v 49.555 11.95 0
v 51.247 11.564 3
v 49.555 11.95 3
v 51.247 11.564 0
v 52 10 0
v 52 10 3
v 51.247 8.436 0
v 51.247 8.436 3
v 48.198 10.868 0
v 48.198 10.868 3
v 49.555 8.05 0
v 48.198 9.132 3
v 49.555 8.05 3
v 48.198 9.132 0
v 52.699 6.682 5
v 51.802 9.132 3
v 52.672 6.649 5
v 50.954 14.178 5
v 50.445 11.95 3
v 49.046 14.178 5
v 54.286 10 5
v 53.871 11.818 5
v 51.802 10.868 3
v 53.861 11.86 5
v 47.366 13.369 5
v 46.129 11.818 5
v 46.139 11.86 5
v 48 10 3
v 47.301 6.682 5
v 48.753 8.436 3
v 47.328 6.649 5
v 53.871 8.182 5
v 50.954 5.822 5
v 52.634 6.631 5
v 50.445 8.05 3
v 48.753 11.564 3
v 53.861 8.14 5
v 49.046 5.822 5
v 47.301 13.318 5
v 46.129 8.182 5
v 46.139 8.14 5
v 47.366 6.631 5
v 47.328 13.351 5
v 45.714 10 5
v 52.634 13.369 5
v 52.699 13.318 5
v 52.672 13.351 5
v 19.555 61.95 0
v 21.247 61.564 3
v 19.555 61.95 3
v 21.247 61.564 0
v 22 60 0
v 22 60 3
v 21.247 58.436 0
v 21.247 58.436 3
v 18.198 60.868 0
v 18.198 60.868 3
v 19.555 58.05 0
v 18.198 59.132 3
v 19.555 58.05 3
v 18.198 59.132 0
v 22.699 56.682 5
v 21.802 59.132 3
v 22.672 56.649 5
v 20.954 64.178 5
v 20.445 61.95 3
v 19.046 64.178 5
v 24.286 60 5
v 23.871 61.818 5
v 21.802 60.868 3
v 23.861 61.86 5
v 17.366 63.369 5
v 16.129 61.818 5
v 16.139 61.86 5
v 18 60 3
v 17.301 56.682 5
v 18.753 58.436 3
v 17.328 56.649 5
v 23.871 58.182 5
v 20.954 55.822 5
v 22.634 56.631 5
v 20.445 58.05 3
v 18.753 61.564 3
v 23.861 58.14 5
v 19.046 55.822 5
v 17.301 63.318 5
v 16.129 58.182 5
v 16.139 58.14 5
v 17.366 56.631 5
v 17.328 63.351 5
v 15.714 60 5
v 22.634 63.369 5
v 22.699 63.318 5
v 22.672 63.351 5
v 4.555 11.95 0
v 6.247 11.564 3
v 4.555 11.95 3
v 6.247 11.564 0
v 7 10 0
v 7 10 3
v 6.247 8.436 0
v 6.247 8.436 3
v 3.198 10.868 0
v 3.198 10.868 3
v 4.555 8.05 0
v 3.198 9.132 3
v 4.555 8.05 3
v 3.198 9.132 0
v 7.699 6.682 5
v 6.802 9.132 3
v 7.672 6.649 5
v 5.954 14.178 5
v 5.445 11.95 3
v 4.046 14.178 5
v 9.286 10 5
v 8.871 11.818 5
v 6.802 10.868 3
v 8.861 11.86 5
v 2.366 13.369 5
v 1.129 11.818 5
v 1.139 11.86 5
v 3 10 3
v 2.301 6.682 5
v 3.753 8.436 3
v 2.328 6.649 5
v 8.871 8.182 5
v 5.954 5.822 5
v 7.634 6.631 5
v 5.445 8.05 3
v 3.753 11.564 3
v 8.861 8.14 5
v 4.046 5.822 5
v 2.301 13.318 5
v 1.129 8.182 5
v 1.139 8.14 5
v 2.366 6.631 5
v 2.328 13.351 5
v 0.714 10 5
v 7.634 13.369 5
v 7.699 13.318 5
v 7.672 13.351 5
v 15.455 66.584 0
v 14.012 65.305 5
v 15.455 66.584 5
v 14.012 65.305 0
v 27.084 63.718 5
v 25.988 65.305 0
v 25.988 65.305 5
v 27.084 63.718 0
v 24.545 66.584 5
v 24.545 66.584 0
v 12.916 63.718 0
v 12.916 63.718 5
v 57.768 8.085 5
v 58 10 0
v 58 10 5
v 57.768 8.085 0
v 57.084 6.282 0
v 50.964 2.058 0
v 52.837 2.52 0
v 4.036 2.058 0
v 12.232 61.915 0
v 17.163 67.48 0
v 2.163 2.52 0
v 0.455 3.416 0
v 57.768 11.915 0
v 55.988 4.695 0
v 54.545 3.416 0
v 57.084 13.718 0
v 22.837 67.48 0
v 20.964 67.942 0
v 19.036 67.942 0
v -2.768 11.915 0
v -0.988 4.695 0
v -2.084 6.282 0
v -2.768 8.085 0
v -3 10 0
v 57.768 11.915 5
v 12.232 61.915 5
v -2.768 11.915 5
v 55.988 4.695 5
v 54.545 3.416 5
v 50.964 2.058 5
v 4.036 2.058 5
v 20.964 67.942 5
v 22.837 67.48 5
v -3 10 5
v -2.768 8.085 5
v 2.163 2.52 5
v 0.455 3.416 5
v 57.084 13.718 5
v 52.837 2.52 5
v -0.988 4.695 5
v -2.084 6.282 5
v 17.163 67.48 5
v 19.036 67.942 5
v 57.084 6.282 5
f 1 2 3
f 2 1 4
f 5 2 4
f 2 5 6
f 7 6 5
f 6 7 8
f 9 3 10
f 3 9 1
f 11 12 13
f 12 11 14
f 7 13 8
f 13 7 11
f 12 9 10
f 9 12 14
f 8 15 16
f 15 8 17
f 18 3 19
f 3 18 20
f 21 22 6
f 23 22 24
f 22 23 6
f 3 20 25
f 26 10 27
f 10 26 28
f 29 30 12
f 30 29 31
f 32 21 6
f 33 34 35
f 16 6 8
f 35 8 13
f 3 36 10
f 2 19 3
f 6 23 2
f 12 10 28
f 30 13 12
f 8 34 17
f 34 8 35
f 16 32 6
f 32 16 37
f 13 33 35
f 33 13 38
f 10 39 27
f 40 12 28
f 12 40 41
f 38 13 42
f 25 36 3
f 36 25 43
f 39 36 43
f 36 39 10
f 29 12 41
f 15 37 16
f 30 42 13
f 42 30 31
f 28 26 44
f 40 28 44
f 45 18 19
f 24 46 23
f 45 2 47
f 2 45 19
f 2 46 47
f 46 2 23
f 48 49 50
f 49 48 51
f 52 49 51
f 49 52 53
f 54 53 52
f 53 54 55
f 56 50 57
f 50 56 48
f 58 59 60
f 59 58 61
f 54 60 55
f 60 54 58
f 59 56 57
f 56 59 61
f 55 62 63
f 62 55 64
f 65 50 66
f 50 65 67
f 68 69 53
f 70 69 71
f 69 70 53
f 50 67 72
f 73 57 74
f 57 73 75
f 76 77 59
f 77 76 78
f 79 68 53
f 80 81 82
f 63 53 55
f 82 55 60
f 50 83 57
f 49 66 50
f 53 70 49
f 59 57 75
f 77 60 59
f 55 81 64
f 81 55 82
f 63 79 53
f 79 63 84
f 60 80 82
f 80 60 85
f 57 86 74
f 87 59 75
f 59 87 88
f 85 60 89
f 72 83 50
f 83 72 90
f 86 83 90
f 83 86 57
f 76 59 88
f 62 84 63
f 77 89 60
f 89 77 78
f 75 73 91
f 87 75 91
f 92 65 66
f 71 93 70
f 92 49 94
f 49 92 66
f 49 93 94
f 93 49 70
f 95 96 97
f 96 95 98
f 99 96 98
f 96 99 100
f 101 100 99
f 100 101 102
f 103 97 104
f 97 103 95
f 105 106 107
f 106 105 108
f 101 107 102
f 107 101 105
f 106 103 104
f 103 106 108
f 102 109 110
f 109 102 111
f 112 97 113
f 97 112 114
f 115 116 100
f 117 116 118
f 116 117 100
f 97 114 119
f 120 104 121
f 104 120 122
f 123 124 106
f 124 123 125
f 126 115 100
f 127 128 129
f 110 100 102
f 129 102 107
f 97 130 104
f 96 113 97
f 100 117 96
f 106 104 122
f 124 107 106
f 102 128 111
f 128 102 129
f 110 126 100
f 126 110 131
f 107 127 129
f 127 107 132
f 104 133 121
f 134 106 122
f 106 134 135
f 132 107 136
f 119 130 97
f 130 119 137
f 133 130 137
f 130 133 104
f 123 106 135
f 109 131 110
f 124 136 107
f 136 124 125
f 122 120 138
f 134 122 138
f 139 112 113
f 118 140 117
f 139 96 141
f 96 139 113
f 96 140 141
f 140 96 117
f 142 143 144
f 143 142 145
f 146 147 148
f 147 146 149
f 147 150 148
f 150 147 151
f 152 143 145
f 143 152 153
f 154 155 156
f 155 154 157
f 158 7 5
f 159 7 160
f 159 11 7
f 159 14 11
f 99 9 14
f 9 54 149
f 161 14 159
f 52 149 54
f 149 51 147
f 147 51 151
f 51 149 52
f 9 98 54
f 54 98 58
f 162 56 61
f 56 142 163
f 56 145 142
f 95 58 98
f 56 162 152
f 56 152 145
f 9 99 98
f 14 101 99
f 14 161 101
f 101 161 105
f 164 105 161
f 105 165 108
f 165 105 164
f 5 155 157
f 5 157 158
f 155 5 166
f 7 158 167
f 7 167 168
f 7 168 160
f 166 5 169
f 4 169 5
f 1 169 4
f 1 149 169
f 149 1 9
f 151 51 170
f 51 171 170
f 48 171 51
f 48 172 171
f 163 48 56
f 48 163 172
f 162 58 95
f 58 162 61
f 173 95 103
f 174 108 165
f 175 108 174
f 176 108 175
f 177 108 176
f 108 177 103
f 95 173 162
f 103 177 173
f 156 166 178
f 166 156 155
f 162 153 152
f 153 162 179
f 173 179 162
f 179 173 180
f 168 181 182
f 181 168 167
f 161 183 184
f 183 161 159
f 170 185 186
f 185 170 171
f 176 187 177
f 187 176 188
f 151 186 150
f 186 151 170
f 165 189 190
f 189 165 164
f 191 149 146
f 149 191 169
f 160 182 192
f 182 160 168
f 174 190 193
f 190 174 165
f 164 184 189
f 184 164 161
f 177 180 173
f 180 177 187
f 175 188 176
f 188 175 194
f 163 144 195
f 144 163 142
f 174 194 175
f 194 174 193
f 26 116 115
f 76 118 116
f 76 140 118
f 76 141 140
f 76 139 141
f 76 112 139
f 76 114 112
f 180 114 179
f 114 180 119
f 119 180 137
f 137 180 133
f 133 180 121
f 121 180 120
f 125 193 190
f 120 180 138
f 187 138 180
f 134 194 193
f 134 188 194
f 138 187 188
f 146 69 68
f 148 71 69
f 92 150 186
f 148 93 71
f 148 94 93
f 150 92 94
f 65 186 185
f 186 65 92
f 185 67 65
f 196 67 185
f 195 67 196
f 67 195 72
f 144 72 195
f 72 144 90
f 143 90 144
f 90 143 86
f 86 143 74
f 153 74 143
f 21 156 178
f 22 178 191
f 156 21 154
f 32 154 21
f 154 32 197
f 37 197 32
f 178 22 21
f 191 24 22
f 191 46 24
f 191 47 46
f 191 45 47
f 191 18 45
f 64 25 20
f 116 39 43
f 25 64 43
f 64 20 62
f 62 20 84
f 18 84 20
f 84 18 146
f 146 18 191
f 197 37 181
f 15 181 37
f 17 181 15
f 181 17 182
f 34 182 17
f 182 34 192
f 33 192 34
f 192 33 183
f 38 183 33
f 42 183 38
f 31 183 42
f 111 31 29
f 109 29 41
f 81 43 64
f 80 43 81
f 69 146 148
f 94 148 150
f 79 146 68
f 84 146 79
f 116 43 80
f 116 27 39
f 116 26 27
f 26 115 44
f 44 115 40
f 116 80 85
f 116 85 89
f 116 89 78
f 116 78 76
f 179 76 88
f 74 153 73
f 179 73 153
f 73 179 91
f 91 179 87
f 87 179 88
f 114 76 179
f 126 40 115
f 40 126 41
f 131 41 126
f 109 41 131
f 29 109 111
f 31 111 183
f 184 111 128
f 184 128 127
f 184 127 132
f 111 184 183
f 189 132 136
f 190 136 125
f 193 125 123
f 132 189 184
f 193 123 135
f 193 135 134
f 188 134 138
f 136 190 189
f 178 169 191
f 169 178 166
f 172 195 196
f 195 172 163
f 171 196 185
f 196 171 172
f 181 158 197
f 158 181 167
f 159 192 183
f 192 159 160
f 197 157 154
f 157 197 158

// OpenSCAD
module flat_head_screw(d, h) {   
    d = d/2;
    //Hole
    translate([0, 0, -(h+d+0.1)])
    cylinder(h+0.2, d, d); 
    //head
    translate([0, 0, -d])
    cylinder(d+0.1, d, 2*(d+0.2));
}

module mounting_plate(hole_pos, thikness, hole_diam, offset)
{
    difference()
    {
        hull()
        {
            for(p=hole_pos)
            {
                translate(p)
                cylinder(h=thikness, r=offset);
            }
        }
        for(p=hole_pos)
        {
            translate(concat(p, thikness))
                flat_head_screw(hole_diam, thikness);
        }
    }
}

mounting_plate([[50,10], [20,60], [5,10]], 5, 4, 8);
